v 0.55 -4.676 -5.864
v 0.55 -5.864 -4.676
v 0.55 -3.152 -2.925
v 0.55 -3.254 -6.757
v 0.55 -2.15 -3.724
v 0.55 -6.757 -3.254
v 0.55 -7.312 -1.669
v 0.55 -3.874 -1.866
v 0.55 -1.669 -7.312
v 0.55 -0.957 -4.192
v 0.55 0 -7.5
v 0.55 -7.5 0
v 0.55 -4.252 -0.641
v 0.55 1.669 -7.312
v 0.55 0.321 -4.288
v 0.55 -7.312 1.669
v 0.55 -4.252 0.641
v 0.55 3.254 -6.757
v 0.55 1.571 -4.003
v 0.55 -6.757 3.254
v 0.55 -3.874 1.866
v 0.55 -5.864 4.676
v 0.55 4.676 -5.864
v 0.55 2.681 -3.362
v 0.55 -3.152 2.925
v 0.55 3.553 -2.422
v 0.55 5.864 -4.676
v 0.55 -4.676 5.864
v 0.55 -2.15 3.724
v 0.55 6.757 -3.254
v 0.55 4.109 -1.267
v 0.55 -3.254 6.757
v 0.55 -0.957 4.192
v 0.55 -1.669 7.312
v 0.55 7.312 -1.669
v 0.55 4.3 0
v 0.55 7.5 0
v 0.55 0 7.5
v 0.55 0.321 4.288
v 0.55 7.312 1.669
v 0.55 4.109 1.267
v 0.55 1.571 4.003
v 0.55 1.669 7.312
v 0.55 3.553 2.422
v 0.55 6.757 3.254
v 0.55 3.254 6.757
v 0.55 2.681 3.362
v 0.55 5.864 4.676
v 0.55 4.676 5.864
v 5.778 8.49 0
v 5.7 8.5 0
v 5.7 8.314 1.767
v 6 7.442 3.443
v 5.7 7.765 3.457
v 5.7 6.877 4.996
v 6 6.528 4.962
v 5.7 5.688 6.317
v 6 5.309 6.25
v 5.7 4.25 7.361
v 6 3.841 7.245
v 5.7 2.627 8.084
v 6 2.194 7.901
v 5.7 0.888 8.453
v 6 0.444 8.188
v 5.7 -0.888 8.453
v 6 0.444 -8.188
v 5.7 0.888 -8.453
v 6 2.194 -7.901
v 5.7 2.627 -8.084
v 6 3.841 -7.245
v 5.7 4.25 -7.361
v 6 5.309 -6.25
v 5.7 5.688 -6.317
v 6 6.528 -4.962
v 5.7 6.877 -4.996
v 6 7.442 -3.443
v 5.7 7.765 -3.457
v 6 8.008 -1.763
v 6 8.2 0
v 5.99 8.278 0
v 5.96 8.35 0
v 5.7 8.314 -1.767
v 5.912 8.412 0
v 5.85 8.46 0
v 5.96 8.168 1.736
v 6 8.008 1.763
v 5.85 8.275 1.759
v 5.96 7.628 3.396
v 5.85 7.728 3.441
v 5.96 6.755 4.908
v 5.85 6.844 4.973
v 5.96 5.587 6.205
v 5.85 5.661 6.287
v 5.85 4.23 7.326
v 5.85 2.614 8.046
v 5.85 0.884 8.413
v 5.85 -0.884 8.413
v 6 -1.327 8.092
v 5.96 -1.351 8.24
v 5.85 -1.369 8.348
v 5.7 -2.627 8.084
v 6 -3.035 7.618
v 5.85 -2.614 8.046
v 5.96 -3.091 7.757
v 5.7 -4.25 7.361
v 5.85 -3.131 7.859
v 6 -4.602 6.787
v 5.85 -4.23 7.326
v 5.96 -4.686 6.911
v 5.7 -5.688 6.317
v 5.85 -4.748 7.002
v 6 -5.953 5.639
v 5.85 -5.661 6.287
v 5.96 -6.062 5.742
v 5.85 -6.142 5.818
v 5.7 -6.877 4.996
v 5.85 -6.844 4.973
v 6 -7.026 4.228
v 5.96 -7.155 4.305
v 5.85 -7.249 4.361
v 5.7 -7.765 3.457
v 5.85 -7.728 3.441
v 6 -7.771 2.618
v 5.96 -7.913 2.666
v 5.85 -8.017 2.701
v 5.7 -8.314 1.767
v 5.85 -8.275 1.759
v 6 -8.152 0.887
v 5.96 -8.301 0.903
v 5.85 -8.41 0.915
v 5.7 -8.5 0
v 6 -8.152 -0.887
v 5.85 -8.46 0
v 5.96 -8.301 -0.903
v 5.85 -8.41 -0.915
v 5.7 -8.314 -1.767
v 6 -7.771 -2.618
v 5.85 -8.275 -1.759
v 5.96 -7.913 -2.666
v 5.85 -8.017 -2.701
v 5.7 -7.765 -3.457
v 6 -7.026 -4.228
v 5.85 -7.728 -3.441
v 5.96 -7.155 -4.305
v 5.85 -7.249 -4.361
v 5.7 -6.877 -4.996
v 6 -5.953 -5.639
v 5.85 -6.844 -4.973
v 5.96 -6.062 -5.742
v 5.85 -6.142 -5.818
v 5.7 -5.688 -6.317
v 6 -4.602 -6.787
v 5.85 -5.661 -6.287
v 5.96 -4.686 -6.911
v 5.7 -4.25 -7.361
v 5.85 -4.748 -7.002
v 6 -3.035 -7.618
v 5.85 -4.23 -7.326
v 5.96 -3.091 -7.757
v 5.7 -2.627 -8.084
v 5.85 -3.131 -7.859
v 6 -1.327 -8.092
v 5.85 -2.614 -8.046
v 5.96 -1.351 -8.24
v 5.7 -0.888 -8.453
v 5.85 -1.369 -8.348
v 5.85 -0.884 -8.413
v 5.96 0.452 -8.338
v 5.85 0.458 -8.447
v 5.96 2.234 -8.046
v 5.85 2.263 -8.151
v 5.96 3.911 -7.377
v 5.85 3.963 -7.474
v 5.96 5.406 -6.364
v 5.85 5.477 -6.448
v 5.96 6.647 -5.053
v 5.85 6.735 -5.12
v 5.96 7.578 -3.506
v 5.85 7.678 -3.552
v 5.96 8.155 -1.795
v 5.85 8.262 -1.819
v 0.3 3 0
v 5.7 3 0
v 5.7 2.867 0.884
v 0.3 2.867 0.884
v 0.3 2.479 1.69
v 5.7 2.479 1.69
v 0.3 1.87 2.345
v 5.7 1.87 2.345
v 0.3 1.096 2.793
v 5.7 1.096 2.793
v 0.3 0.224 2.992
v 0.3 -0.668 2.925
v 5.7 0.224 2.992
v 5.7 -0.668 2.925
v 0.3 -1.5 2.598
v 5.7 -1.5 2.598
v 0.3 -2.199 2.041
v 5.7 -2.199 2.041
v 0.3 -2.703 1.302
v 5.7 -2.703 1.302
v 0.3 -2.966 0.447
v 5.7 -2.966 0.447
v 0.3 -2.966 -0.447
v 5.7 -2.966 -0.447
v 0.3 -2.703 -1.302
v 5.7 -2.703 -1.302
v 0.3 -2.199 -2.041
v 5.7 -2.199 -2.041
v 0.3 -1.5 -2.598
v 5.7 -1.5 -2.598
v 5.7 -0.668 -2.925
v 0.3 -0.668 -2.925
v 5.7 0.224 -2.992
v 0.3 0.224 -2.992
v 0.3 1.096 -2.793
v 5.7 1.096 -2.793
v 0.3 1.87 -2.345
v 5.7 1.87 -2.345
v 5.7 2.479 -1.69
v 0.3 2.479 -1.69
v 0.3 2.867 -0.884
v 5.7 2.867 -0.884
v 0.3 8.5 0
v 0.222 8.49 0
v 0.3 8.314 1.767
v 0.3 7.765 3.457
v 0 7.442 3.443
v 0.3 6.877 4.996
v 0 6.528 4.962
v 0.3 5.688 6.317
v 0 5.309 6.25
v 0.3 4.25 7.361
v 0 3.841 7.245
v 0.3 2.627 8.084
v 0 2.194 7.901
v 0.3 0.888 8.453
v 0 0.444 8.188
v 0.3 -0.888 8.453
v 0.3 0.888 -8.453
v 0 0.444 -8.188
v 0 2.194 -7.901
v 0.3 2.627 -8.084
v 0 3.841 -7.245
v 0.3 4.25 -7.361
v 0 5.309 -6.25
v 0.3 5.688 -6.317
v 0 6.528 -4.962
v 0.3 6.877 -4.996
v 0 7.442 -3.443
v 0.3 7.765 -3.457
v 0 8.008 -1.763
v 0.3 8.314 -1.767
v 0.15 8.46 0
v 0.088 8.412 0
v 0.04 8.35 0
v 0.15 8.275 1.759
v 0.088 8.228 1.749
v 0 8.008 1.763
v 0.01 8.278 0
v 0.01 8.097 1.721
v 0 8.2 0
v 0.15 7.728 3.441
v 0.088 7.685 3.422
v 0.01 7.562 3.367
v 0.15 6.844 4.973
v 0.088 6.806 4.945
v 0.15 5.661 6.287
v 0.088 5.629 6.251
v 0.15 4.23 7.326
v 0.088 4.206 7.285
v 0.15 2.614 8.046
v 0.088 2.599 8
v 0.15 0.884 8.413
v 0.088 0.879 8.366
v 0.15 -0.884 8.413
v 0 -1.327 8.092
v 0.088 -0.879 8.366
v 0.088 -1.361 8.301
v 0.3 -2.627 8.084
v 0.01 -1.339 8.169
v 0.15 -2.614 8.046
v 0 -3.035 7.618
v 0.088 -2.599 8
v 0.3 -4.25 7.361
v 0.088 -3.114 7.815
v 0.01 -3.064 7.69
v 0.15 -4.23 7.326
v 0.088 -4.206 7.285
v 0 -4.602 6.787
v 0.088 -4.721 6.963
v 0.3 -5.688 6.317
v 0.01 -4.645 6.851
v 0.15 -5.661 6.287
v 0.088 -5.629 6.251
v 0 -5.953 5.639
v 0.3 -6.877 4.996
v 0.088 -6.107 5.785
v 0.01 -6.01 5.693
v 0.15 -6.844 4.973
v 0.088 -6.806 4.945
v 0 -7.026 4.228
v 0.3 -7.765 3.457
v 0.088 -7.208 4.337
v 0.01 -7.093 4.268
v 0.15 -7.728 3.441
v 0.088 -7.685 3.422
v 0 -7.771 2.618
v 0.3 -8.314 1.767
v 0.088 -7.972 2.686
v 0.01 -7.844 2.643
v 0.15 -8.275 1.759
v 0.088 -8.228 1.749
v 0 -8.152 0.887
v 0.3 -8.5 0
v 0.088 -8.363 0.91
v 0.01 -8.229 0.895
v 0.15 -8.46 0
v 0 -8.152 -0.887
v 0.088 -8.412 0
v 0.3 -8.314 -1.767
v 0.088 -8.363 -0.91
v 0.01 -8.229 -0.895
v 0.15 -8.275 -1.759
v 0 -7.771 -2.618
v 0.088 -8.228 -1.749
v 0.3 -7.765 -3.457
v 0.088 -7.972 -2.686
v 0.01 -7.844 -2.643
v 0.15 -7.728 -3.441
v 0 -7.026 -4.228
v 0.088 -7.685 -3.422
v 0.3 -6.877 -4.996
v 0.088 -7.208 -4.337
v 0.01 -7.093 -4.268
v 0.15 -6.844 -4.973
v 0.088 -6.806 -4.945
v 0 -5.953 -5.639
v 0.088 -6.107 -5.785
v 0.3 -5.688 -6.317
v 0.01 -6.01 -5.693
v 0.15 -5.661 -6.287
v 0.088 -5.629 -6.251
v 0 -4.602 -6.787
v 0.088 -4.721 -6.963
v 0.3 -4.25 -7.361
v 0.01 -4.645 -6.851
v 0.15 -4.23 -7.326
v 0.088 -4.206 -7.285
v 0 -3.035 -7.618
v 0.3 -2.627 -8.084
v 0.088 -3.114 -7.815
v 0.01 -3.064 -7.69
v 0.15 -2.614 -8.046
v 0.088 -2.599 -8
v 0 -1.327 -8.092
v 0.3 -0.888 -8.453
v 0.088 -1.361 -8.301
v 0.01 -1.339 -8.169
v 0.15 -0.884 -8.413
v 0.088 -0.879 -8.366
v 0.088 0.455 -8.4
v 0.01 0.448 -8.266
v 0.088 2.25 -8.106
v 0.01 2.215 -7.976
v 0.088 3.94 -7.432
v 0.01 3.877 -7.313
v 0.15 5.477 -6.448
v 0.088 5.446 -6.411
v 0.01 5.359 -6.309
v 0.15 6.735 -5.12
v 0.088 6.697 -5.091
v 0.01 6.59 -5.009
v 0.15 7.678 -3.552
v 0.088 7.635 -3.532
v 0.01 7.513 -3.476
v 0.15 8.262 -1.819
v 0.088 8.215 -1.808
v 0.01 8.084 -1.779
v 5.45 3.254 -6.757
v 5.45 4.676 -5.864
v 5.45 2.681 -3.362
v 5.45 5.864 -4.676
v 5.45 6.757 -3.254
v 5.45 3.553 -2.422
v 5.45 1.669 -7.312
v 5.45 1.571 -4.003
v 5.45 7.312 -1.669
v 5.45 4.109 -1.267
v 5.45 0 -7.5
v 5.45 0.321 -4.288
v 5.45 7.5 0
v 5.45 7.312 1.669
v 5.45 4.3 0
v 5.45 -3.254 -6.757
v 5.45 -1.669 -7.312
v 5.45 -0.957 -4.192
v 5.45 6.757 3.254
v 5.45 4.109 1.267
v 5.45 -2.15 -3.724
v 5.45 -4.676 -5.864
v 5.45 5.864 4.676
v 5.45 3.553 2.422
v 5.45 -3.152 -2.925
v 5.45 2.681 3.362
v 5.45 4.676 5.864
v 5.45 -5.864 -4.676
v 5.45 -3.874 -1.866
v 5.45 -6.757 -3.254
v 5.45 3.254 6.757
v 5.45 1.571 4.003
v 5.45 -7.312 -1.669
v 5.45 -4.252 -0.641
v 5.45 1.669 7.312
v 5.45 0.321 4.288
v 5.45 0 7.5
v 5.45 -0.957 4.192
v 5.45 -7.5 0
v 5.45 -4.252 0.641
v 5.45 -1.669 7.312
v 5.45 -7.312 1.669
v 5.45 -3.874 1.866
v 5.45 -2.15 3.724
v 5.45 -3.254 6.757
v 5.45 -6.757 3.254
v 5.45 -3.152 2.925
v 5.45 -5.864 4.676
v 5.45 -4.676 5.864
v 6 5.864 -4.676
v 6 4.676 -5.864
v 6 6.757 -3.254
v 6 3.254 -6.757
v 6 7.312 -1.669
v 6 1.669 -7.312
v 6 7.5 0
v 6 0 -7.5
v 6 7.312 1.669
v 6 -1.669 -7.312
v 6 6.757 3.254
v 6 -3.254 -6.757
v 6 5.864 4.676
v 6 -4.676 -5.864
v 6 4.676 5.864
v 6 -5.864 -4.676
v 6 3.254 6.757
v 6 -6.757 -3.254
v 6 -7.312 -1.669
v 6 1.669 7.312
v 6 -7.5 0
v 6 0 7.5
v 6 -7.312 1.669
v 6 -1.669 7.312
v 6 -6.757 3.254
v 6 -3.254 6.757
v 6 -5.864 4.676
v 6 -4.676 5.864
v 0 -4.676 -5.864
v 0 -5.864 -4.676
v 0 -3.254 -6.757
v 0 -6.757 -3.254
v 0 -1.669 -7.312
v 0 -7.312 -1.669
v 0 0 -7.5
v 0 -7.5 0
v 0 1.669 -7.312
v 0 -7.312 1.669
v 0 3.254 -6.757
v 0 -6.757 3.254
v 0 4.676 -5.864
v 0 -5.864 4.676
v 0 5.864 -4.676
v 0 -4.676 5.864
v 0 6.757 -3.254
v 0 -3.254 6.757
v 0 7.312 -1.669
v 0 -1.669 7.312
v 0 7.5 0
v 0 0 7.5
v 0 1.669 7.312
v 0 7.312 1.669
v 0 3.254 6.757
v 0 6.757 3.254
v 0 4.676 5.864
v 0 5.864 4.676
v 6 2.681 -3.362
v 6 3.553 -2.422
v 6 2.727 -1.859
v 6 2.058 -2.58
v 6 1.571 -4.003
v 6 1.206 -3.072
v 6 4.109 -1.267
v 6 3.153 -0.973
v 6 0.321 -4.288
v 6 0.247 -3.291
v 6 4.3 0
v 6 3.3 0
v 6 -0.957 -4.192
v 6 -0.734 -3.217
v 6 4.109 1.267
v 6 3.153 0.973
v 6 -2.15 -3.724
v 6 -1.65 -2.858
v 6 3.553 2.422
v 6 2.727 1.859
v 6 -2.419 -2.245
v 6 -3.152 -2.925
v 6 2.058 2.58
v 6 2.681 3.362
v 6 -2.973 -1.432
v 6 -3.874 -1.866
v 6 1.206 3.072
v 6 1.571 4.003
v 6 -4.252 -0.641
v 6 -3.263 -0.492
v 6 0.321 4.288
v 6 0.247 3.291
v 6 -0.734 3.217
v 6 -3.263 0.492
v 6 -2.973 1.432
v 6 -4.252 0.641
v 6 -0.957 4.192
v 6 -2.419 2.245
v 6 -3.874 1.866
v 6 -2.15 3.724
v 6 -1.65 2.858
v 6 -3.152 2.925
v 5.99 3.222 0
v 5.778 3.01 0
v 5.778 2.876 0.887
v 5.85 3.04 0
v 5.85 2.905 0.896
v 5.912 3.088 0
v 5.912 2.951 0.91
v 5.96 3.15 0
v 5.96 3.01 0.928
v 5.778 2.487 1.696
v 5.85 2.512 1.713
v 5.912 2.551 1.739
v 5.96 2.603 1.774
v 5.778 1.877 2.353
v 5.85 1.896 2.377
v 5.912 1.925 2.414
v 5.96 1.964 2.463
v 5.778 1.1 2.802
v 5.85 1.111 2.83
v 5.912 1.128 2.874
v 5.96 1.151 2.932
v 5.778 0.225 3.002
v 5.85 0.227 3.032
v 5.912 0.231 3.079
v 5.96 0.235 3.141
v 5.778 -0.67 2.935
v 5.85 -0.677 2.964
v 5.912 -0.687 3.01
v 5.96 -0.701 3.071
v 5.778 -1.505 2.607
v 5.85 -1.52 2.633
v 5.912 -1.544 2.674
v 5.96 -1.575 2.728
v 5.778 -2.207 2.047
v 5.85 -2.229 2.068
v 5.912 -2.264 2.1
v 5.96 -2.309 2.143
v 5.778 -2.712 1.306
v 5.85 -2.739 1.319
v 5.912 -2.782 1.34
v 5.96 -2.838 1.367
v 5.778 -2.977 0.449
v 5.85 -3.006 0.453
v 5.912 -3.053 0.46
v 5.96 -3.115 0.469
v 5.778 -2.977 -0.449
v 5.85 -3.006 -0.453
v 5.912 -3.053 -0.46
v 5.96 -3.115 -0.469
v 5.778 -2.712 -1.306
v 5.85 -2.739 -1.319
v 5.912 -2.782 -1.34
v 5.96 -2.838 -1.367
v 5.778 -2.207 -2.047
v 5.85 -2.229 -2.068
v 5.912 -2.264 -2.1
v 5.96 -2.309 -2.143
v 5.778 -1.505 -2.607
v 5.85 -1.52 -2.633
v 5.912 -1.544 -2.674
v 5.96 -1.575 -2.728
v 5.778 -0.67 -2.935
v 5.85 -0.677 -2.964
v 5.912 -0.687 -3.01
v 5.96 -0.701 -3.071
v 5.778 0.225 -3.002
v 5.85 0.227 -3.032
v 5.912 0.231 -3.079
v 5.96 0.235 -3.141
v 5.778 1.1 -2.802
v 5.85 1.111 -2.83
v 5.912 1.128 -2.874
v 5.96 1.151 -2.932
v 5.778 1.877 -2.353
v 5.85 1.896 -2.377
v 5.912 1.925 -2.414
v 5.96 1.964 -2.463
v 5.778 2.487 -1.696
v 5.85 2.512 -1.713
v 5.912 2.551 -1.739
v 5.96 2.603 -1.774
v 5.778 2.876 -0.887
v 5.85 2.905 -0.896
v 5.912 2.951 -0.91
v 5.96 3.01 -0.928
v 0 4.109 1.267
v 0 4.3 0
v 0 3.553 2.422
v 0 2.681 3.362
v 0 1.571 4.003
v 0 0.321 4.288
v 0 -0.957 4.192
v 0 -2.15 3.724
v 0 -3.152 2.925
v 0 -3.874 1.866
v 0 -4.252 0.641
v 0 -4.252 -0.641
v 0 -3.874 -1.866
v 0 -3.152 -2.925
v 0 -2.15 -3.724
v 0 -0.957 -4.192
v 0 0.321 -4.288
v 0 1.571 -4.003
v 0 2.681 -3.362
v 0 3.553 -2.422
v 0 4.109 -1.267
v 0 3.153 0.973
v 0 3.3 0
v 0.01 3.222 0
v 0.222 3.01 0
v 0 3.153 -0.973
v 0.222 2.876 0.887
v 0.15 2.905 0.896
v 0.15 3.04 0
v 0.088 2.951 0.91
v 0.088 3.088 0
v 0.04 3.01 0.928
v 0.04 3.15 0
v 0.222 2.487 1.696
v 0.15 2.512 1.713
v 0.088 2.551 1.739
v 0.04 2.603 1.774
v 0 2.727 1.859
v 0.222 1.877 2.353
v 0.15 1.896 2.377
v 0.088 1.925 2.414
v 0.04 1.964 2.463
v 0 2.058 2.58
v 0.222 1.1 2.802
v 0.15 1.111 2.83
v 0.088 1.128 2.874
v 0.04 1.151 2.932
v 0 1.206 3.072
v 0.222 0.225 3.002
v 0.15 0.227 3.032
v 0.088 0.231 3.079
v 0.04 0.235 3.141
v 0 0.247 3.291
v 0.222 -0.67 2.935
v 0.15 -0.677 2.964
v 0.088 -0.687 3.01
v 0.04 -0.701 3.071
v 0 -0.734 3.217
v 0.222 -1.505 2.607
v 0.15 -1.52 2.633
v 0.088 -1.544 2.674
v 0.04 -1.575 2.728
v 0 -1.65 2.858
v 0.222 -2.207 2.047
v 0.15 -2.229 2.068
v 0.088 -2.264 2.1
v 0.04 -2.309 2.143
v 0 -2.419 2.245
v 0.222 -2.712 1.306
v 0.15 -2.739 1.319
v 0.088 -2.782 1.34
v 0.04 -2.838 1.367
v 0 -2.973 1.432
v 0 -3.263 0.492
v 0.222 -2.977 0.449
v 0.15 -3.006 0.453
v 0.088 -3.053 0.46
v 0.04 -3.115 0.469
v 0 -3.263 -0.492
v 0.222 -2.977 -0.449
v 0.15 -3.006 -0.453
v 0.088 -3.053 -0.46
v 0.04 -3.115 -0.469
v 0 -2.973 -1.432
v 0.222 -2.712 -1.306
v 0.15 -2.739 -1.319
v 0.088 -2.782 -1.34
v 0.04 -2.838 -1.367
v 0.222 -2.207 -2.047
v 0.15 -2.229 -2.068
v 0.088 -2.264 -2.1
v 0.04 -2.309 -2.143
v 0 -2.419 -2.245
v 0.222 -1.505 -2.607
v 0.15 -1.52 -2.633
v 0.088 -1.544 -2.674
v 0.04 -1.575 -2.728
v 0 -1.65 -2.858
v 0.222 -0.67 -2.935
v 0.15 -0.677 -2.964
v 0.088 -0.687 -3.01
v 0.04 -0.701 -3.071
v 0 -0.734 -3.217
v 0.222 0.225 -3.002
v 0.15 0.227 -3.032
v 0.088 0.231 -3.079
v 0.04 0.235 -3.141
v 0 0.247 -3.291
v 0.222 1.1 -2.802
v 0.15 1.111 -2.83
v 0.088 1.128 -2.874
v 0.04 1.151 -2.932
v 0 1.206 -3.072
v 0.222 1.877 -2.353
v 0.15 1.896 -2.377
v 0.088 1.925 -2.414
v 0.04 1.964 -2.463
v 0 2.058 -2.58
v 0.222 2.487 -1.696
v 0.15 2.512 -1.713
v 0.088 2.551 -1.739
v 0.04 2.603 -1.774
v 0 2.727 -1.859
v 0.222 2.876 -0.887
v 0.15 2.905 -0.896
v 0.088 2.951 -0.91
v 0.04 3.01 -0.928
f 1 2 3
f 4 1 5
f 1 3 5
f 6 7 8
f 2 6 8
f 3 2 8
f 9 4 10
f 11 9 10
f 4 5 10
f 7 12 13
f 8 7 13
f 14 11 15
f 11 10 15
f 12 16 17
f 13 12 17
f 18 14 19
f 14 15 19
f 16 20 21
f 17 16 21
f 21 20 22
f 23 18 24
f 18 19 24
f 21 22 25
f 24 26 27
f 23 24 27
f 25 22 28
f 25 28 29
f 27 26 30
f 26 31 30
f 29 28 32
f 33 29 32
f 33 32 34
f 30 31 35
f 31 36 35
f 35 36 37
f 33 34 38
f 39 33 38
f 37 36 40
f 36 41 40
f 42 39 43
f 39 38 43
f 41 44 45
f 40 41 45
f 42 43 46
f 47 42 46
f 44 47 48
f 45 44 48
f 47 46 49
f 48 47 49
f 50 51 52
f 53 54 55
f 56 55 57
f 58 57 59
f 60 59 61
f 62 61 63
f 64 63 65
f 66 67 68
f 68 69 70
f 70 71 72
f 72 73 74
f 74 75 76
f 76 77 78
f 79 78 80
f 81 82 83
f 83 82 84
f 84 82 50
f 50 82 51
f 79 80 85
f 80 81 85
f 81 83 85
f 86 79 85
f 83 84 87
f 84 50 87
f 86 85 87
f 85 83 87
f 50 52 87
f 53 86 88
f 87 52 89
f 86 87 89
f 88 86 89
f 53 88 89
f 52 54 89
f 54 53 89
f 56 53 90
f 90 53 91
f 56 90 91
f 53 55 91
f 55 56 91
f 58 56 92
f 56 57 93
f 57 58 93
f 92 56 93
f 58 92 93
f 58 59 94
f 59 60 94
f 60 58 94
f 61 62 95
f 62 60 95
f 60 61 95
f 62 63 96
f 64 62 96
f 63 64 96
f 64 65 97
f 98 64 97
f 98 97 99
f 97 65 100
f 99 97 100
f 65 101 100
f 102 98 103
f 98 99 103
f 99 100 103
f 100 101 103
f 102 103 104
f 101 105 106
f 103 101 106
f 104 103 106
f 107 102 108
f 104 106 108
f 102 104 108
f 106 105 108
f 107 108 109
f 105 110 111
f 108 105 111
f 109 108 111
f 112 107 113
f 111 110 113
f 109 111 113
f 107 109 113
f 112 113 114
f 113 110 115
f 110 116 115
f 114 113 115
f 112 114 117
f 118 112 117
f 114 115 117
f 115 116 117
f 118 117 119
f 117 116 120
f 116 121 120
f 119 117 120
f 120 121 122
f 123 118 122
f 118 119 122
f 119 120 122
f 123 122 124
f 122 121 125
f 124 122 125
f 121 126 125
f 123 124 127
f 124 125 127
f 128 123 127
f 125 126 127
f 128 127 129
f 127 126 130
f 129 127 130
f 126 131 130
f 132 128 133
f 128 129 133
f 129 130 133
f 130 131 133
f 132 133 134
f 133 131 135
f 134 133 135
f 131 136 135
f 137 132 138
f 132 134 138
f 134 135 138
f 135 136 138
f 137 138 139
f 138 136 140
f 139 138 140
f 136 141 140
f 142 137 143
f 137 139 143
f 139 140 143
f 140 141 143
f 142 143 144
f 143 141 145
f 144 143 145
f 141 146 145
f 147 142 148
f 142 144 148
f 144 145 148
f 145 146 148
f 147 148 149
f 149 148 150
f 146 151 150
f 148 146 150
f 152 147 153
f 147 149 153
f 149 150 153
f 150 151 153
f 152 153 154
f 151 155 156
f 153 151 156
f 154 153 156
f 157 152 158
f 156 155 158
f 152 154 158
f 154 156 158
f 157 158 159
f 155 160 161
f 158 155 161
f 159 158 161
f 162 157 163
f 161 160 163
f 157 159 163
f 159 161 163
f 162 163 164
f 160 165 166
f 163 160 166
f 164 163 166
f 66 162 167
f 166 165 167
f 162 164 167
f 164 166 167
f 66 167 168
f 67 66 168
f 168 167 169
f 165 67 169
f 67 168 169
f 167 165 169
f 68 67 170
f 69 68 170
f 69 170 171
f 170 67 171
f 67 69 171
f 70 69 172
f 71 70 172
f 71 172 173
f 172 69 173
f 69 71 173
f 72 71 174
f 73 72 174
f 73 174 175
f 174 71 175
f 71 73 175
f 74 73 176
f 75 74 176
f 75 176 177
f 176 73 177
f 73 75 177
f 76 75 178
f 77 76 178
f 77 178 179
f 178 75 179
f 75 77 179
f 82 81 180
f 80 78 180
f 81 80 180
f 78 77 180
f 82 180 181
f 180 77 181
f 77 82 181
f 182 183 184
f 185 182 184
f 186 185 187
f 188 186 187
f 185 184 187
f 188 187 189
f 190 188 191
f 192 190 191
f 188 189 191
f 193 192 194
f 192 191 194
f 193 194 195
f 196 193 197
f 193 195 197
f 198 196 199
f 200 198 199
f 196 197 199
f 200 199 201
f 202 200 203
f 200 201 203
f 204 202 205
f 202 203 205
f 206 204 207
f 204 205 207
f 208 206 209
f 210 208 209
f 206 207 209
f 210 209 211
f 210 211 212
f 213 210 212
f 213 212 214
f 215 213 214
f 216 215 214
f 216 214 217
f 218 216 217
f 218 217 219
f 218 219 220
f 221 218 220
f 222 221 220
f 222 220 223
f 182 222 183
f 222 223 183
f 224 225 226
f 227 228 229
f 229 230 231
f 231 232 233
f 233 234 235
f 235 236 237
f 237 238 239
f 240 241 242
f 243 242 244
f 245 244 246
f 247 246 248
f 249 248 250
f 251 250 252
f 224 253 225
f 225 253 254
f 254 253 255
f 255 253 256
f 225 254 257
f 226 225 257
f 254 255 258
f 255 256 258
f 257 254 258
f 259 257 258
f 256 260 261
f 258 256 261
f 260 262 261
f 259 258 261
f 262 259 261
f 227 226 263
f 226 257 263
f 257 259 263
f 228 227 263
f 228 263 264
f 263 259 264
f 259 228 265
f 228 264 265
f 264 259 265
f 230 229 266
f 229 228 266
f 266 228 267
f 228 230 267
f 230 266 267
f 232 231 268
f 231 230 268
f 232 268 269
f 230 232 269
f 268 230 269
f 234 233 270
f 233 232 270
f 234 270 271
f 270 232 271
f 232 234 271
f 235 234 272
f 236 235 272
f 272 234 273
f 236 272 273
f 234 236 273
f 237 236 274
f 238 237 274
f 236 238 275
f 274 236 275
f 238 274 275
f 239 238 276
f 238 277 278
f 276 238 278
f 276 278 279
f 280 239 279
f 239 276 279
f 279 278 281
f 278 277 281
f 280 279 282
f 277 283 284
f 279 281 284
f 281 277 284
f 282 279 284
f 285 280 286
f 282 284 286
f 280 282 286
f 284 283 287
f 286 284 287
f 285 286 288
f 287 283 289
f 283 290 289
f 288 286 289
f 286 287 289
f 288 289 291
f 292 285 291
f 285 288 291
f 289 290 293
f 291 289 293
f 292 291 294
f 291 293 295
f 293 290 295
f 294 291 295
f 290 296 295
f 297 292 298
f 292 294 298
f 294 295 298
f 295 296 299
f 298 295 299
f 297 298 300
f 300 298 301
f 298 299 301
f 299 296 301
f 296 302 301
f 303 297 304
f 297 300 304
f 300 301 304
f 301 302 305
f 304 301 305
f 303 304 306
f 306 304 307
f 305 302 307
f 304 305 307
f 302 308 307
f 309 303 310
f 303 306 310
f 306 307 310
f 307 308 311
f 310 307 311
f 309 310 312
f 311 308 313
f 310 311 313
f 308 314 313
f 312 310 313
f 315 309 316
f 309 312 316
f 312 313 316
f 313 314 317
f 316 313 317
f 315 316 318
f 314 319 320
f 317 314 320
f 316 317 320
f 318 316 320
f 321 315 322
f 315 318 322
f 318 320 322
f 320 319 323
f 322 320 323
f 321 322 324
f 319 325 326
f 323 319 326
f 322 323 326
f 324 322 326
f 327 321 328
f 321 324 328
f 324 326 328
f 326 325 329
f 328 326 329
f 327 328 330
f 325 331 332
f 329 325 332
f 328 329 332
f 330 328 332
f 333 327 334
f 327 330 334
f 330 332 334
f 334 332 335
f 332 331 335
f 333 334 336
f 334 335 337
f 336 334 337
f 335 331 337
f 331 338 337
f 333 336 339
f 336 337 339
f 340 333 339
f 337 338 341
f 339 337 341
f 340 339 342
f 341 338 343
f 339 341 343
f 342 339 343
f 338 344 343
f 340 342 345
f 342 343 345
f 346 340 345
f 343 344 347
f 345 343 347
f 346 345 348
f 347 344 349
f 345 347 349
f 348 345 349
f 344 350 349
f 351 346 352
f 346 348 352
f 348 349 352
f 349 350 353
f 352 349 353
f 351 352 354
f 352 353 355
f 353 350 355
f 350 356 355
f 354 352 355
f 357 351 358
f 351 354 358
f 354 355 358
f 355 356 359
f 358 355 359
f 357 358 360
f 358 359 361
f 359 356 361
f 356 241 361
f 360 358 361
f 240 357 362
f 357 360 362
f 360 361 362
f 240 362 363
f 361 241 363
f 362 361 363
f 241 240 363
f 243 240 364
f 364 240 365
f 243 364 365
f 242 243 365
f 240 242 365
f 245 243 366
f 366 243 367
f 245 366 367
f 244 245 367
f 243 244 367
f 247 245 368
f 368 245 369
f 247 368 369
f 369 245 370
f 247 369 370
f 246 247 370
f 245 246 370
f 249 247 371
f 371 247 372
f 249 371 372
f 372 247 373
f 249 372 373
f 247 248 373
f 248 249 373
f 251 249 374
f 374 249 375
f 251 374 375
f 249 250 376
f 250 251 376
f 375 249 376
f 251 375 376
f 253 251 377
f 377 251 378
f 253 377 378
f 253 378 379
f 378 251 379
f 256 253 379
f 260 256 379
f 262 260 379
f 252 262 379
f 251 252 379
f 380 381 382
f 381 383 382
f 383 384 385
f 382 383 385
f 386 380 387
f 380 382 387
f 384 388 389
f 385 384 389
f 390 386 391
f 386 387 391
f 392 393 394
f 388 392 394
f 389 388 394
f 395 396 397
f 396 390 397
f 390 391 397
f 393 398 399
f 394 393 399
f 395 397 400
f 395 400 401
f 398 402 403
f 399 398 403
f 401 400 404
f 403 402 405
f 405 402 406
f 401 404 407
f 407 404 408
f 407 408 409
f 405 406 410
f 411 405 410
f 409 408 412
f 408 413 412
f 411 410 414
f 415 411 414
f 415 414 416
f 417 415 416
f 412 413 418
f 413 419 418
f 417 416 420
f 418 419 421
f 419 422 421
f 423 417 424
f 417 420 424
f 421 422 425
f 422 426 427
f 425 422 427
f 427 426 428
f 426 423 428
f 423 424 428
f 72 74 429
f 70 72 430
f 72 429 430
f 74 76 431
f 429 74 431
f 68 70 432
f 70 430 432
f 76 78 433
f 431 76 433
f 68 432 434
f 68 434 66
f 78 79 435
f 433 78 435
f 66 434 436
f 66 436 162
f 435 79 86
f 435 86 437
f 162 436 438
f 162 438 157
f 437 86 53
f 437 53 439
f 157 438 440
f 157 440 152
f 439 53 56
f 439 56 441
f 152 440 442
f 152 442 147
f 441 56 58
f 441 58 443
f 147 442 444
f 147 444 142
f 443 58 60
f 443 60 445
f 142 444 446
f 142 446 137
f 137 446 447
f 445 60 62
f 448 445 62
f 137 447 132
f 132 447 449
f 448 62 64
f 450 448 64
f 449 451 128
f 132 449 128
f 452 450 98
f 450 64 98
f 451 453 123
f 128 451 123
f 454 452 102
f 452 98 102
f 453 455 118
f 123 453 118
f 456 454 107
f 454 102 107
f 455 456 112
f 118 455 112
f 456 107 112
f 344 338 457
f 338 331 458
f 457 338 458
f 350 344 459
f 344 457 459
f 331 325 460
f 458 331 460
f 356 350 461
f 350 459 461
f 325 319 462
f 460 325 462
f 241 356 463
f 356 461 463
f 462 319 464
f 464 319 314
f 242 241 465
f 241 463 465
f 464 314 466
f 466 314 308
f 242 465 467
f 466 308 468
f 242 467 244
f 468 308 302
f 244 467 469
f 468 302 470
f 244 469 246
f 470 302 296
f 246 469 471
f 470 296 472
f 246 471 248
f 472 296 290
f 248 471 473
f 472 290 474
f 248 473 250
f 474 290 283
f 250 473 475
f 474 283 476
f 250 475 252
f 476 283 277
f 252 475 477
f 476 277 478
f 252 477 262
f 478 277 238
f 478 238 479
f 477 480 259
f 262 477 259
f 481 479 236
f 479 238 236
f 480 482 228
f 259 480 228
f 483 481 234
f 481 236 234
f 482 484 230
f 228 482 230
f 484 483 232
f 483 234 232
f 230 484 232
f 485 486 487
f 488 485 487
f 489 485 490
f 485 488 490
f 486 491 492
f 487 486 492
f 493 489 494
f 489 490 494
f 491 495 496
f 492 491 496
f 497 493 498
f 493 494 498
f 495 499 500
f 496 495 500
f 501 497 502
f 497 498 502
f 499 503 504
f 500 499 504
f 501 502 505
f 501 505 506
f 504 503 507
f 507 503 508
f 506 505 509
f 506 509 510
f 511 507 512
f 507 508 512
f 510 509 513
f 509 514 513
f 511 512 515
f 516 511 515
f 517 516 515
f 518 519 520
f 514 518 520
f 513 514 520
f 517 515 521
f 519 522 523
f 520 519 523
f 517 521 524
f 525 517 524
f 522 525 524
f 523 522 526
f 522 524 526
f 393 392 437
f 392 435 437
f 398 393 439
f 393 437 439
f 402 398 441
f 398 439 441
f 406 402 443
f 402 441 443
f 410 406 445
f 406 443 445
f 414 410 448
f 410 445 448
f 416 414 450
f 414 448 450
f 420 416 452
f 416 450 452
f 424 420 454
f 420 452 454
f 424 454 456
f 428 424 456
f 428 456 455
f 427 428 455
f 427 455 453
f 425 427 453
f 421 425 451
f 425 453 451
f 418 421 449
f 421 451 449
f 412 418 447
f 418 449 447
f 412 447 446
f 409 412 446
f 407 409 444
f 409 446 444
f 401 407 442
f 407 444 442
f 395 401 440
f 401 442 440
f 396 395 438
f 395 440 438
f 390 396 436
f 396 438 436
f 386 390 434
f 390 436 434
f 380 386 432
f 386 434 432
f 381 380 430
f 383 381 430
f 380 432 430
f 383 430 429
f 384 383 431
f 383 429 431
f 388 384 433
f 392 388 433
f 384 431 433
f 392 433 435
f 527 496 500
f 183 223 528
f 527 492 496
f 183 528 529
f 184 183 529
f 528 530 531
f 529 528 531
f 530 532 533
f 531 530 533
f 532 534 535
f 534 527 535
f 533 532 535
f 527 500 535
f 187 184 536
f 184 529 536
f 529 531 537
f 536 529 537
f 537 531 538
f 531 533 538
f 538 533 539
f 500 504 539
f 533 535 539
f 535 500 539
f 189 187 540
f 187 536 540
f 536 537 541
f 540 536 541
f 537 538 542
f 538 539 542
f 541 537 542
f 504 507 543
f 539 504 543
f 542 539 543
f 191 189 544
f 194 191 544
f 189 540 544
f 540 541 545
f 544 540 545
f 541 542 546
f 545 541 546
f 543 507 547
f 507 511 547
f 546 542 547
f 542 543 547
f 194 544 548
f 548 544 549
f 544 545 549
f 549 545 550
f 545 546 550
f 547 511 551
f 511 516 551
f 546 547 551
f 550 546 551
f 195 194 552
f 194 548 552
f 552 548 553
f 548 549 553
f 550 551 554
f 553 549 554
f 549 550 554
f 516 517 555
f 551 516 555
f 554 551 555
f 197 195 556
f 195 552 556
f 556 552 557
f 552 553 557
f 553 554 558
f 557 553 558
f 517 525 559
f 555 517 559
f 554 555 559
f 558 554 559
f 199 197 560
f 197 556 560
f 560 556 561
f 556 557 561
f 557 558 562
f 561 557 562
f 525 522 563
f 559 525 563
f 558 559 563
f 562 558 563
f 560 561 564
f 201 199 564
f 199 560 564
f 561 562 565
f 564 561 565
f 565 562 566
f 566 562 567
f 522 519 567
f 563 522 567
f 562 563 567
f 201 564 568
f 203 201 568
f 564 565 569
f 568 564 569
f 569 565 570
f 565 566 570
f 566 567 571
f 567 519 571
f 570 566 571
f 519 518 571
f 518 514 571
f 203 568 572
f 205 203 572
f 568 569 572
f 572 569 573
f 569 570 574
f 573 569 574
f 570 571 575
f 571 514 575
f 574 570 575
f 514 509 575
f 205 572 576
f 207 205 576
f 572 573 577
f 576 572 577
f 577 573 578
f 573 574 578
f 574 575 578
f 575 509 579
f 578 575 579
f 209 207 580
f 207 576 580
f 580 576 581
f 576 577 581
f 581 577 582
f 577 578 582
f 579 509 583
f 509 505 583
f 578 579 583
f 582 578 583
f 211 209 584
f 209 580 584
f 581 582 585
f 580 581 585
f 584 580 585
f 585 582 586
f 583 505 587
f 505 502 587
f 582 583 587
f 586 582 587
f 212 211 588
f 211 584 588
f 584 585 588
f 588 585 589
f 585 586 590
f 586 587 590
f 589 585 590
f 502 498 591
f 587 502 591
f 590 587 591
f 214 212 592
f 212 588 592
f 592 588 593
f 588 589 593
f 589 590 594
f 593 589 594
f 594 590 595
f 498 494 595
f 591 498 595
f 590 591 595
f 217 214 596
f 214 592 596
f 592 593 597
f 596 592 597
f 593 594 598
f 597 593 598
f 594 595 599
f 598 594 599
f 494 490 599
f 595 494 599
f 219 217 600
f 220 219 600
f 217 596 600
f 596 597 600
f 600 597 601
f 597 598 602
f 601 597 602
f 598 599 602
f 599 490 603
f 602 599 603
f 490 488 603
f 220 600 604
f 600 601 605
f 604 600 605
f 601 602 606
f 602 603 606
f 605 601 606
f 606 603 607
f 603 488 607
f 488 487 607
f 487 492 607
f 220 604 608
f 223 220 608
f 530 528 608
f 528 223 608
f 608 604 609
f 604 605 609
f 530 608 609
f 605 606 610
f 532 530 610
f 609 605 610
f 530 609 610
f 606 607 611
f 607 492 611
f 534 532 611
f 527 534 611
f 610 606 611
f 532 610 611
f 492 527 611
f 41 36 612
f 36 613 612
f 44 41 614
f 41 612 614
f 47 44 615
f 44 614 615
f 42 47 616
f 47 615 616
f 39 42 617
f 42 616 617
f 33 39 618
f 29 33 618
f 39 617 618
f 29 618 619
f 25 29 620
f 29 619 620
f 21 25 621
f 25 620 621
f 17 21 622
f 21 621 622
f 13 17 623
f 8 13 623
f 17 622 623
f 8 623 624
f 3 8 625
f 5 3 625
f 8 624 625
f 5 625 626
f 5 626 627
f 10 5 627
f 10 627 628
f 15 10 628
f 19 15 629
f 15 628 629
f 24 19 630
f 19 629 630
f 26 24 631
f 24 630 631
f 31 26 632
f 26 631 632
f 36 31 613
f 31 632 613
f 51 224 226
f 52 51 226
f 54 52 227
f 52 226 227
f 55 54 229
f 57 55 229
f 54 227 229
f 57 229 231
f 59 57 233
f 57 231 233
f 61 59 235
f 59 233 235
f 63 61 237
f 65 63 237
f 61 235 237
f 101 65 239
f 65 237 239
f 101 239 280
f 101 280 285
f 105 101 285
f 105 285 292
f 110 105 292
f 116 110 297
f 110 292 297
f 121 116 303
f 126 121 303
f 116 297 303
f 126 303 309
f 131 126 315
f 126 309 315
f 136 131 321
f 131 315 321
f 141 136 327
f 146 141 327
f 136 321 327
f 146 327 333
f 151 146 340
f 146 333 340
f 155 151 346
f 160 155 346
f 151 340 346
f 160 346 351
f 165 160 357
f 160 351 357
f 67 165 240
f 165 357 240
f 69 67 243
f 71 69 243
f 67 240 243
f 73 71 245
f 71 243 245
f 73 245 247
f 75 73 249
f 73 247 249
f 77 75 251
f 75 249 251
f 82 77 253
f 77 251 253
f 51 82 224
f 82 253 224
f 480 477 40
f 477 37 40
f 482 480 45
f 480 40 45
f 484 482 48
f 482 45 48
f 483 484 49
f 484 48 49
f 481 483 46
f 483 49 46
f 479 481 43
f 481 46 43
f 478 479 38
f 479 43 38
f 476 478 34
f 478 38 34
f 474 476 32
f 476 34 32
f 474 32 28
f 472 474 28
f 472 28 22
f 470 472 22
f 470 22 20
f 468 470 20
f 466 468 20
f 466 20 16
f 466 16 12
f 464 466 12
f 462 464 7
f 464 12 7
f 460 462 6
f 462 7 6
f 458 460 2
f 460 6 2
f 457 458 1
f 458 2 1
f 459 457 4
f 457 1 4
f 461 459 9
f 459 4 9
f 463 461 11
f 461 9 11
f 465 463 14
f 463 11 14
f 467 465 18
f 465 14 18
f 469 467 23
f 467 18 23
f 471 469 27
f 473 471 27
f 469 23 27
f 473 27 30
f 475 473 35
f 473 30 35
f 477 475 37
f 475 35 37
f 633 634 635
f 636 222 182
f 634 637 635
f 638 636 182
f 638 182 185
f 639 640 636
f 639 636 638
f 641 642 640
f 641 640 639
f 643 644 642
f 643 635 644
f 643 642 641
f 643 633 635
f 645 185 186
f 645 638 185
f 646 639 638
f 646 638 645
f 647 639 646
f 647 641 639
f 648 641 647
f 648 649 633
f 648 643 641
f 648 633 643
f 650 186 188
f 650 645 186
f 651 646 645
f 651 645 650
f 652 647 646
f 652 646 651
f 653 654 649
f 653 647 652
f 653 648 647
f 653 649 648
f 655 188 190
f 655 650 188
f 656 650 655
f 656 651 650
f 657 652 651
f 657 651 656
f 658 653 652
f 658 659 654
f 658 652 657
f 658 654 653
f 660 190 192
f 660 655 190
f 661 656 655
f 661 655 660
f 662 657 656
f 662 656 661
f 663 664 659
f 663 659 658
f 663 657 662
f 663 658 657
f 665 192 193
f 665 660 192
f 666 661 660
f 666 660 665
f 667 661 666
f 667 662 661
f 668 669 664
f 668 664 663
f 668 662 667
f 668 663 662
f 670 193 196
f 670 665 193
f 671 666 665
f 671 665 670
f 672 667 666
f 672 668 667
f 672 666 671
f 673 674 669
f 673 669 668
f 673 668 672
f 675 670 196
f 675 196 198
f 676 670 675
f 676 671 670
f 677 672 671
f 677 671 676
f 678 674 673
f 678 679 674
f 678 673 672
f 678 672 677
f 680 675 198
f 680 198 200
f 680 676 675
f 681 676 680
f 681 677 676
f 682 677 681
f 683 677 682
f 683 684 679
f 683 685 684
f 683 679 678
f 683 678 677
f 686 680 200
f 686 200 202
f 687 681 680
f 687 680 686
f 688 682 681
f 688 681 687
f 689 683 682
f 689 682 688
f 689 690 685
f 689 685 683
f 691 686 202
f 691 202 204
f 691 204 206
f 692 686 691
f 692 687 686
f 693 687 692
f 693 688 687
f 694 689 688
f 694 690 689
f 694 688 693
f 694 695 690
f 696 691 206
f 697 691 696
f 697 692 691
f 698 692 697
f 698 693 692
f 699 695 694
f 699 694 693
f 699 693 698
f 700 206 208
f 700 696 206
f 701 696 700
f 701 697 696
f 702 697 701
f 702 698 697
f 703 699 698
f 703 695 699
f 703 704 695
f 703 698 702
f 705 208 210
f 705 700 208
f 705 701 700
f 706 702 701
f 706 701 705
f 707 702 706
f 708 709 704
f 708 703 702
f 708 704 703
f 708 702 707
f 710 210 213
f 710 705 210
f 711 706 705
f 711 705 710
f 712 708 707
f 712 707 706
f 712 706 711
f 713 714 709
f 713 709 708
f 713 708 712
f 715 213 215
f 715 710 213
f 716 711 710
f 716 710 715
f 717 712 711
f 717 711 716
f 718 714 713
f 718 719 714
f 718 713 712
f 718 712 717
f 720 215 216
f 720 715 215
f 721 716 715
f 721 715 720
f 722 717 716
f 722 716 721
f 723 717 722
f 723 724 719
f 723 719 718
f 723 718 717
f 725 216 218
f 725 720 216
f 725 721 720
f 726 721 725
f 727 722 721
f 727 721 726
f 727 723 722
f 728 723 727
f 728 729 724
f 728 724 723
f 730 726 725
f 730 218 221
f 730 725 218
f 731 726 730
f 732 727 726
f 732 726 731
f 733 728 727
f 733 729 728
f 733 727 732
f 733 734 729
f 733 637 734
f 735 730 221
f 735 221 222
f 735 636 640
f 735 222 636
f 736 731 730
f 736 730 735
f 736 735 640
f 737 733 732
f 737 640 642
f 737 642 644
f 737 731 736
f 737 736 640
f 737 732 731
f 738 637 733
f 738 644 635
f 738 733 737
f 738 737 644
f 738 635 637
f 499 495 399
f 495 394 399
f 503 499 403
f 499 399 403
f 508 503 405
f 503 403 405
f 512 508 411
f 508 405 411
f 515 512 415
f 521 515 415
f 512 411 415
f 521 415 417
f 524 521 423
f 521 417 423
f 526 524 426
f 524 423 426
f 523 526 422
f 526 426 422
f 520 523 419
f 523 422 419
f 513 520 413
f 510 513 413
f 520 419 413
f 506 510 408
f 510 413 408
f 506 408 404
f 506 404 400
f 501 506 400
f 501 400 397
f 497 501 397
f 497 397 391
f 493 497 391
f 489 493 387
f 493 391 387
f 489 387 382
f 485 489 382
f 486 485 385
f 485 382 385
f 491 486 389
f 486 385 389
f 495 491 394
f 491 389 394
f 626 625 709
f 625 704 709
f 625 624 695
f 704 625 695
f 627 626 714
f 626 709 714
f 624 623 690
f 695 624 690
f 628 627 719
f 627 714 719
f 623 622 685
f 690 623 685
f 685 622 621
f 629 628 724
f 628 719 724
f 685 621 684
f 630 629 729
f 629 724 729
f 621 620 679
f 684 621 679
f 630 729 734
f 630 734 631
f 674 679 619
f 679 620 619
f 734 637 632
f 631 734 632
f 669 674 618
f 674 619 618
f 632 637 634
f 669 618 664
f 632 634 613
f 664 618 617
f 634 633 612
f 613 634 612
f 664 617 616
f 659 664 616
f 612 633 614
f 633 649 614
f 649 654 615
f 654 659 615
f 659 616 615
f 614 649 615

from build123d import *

# Parameters (mm, degrees)
FILLET1_R = 0.3


with BuildPart() as part:
    # Sketch1 → Revolve1 (revolve)
    with BuildSketch(Plane.XY):
        Polygon((0, 3), (6, 3), (6, 4.3), (5.45, 4.3), (5.45, 7.5), (6, 7.5), (6, 8.5), (0, 8.5), (0, 7.5), (0.55, 7.5), (0.55, 4.3), (0, 4.3), align=None)
    revolve(axis=Axis((0, 0, 0), (1, 0, 0)))

    # Fillet1
    fillet1_edges = [part.edges().sort_by_distance(p)[0] for p in [
        (0, -8.5, 0),
        (6, -8.5, 0),
        (6, -3, 0),
        (0, -3, 0),
    ]]
    fillet(fillet1_edges, radius=FILLET1_R)


solid = part.part
